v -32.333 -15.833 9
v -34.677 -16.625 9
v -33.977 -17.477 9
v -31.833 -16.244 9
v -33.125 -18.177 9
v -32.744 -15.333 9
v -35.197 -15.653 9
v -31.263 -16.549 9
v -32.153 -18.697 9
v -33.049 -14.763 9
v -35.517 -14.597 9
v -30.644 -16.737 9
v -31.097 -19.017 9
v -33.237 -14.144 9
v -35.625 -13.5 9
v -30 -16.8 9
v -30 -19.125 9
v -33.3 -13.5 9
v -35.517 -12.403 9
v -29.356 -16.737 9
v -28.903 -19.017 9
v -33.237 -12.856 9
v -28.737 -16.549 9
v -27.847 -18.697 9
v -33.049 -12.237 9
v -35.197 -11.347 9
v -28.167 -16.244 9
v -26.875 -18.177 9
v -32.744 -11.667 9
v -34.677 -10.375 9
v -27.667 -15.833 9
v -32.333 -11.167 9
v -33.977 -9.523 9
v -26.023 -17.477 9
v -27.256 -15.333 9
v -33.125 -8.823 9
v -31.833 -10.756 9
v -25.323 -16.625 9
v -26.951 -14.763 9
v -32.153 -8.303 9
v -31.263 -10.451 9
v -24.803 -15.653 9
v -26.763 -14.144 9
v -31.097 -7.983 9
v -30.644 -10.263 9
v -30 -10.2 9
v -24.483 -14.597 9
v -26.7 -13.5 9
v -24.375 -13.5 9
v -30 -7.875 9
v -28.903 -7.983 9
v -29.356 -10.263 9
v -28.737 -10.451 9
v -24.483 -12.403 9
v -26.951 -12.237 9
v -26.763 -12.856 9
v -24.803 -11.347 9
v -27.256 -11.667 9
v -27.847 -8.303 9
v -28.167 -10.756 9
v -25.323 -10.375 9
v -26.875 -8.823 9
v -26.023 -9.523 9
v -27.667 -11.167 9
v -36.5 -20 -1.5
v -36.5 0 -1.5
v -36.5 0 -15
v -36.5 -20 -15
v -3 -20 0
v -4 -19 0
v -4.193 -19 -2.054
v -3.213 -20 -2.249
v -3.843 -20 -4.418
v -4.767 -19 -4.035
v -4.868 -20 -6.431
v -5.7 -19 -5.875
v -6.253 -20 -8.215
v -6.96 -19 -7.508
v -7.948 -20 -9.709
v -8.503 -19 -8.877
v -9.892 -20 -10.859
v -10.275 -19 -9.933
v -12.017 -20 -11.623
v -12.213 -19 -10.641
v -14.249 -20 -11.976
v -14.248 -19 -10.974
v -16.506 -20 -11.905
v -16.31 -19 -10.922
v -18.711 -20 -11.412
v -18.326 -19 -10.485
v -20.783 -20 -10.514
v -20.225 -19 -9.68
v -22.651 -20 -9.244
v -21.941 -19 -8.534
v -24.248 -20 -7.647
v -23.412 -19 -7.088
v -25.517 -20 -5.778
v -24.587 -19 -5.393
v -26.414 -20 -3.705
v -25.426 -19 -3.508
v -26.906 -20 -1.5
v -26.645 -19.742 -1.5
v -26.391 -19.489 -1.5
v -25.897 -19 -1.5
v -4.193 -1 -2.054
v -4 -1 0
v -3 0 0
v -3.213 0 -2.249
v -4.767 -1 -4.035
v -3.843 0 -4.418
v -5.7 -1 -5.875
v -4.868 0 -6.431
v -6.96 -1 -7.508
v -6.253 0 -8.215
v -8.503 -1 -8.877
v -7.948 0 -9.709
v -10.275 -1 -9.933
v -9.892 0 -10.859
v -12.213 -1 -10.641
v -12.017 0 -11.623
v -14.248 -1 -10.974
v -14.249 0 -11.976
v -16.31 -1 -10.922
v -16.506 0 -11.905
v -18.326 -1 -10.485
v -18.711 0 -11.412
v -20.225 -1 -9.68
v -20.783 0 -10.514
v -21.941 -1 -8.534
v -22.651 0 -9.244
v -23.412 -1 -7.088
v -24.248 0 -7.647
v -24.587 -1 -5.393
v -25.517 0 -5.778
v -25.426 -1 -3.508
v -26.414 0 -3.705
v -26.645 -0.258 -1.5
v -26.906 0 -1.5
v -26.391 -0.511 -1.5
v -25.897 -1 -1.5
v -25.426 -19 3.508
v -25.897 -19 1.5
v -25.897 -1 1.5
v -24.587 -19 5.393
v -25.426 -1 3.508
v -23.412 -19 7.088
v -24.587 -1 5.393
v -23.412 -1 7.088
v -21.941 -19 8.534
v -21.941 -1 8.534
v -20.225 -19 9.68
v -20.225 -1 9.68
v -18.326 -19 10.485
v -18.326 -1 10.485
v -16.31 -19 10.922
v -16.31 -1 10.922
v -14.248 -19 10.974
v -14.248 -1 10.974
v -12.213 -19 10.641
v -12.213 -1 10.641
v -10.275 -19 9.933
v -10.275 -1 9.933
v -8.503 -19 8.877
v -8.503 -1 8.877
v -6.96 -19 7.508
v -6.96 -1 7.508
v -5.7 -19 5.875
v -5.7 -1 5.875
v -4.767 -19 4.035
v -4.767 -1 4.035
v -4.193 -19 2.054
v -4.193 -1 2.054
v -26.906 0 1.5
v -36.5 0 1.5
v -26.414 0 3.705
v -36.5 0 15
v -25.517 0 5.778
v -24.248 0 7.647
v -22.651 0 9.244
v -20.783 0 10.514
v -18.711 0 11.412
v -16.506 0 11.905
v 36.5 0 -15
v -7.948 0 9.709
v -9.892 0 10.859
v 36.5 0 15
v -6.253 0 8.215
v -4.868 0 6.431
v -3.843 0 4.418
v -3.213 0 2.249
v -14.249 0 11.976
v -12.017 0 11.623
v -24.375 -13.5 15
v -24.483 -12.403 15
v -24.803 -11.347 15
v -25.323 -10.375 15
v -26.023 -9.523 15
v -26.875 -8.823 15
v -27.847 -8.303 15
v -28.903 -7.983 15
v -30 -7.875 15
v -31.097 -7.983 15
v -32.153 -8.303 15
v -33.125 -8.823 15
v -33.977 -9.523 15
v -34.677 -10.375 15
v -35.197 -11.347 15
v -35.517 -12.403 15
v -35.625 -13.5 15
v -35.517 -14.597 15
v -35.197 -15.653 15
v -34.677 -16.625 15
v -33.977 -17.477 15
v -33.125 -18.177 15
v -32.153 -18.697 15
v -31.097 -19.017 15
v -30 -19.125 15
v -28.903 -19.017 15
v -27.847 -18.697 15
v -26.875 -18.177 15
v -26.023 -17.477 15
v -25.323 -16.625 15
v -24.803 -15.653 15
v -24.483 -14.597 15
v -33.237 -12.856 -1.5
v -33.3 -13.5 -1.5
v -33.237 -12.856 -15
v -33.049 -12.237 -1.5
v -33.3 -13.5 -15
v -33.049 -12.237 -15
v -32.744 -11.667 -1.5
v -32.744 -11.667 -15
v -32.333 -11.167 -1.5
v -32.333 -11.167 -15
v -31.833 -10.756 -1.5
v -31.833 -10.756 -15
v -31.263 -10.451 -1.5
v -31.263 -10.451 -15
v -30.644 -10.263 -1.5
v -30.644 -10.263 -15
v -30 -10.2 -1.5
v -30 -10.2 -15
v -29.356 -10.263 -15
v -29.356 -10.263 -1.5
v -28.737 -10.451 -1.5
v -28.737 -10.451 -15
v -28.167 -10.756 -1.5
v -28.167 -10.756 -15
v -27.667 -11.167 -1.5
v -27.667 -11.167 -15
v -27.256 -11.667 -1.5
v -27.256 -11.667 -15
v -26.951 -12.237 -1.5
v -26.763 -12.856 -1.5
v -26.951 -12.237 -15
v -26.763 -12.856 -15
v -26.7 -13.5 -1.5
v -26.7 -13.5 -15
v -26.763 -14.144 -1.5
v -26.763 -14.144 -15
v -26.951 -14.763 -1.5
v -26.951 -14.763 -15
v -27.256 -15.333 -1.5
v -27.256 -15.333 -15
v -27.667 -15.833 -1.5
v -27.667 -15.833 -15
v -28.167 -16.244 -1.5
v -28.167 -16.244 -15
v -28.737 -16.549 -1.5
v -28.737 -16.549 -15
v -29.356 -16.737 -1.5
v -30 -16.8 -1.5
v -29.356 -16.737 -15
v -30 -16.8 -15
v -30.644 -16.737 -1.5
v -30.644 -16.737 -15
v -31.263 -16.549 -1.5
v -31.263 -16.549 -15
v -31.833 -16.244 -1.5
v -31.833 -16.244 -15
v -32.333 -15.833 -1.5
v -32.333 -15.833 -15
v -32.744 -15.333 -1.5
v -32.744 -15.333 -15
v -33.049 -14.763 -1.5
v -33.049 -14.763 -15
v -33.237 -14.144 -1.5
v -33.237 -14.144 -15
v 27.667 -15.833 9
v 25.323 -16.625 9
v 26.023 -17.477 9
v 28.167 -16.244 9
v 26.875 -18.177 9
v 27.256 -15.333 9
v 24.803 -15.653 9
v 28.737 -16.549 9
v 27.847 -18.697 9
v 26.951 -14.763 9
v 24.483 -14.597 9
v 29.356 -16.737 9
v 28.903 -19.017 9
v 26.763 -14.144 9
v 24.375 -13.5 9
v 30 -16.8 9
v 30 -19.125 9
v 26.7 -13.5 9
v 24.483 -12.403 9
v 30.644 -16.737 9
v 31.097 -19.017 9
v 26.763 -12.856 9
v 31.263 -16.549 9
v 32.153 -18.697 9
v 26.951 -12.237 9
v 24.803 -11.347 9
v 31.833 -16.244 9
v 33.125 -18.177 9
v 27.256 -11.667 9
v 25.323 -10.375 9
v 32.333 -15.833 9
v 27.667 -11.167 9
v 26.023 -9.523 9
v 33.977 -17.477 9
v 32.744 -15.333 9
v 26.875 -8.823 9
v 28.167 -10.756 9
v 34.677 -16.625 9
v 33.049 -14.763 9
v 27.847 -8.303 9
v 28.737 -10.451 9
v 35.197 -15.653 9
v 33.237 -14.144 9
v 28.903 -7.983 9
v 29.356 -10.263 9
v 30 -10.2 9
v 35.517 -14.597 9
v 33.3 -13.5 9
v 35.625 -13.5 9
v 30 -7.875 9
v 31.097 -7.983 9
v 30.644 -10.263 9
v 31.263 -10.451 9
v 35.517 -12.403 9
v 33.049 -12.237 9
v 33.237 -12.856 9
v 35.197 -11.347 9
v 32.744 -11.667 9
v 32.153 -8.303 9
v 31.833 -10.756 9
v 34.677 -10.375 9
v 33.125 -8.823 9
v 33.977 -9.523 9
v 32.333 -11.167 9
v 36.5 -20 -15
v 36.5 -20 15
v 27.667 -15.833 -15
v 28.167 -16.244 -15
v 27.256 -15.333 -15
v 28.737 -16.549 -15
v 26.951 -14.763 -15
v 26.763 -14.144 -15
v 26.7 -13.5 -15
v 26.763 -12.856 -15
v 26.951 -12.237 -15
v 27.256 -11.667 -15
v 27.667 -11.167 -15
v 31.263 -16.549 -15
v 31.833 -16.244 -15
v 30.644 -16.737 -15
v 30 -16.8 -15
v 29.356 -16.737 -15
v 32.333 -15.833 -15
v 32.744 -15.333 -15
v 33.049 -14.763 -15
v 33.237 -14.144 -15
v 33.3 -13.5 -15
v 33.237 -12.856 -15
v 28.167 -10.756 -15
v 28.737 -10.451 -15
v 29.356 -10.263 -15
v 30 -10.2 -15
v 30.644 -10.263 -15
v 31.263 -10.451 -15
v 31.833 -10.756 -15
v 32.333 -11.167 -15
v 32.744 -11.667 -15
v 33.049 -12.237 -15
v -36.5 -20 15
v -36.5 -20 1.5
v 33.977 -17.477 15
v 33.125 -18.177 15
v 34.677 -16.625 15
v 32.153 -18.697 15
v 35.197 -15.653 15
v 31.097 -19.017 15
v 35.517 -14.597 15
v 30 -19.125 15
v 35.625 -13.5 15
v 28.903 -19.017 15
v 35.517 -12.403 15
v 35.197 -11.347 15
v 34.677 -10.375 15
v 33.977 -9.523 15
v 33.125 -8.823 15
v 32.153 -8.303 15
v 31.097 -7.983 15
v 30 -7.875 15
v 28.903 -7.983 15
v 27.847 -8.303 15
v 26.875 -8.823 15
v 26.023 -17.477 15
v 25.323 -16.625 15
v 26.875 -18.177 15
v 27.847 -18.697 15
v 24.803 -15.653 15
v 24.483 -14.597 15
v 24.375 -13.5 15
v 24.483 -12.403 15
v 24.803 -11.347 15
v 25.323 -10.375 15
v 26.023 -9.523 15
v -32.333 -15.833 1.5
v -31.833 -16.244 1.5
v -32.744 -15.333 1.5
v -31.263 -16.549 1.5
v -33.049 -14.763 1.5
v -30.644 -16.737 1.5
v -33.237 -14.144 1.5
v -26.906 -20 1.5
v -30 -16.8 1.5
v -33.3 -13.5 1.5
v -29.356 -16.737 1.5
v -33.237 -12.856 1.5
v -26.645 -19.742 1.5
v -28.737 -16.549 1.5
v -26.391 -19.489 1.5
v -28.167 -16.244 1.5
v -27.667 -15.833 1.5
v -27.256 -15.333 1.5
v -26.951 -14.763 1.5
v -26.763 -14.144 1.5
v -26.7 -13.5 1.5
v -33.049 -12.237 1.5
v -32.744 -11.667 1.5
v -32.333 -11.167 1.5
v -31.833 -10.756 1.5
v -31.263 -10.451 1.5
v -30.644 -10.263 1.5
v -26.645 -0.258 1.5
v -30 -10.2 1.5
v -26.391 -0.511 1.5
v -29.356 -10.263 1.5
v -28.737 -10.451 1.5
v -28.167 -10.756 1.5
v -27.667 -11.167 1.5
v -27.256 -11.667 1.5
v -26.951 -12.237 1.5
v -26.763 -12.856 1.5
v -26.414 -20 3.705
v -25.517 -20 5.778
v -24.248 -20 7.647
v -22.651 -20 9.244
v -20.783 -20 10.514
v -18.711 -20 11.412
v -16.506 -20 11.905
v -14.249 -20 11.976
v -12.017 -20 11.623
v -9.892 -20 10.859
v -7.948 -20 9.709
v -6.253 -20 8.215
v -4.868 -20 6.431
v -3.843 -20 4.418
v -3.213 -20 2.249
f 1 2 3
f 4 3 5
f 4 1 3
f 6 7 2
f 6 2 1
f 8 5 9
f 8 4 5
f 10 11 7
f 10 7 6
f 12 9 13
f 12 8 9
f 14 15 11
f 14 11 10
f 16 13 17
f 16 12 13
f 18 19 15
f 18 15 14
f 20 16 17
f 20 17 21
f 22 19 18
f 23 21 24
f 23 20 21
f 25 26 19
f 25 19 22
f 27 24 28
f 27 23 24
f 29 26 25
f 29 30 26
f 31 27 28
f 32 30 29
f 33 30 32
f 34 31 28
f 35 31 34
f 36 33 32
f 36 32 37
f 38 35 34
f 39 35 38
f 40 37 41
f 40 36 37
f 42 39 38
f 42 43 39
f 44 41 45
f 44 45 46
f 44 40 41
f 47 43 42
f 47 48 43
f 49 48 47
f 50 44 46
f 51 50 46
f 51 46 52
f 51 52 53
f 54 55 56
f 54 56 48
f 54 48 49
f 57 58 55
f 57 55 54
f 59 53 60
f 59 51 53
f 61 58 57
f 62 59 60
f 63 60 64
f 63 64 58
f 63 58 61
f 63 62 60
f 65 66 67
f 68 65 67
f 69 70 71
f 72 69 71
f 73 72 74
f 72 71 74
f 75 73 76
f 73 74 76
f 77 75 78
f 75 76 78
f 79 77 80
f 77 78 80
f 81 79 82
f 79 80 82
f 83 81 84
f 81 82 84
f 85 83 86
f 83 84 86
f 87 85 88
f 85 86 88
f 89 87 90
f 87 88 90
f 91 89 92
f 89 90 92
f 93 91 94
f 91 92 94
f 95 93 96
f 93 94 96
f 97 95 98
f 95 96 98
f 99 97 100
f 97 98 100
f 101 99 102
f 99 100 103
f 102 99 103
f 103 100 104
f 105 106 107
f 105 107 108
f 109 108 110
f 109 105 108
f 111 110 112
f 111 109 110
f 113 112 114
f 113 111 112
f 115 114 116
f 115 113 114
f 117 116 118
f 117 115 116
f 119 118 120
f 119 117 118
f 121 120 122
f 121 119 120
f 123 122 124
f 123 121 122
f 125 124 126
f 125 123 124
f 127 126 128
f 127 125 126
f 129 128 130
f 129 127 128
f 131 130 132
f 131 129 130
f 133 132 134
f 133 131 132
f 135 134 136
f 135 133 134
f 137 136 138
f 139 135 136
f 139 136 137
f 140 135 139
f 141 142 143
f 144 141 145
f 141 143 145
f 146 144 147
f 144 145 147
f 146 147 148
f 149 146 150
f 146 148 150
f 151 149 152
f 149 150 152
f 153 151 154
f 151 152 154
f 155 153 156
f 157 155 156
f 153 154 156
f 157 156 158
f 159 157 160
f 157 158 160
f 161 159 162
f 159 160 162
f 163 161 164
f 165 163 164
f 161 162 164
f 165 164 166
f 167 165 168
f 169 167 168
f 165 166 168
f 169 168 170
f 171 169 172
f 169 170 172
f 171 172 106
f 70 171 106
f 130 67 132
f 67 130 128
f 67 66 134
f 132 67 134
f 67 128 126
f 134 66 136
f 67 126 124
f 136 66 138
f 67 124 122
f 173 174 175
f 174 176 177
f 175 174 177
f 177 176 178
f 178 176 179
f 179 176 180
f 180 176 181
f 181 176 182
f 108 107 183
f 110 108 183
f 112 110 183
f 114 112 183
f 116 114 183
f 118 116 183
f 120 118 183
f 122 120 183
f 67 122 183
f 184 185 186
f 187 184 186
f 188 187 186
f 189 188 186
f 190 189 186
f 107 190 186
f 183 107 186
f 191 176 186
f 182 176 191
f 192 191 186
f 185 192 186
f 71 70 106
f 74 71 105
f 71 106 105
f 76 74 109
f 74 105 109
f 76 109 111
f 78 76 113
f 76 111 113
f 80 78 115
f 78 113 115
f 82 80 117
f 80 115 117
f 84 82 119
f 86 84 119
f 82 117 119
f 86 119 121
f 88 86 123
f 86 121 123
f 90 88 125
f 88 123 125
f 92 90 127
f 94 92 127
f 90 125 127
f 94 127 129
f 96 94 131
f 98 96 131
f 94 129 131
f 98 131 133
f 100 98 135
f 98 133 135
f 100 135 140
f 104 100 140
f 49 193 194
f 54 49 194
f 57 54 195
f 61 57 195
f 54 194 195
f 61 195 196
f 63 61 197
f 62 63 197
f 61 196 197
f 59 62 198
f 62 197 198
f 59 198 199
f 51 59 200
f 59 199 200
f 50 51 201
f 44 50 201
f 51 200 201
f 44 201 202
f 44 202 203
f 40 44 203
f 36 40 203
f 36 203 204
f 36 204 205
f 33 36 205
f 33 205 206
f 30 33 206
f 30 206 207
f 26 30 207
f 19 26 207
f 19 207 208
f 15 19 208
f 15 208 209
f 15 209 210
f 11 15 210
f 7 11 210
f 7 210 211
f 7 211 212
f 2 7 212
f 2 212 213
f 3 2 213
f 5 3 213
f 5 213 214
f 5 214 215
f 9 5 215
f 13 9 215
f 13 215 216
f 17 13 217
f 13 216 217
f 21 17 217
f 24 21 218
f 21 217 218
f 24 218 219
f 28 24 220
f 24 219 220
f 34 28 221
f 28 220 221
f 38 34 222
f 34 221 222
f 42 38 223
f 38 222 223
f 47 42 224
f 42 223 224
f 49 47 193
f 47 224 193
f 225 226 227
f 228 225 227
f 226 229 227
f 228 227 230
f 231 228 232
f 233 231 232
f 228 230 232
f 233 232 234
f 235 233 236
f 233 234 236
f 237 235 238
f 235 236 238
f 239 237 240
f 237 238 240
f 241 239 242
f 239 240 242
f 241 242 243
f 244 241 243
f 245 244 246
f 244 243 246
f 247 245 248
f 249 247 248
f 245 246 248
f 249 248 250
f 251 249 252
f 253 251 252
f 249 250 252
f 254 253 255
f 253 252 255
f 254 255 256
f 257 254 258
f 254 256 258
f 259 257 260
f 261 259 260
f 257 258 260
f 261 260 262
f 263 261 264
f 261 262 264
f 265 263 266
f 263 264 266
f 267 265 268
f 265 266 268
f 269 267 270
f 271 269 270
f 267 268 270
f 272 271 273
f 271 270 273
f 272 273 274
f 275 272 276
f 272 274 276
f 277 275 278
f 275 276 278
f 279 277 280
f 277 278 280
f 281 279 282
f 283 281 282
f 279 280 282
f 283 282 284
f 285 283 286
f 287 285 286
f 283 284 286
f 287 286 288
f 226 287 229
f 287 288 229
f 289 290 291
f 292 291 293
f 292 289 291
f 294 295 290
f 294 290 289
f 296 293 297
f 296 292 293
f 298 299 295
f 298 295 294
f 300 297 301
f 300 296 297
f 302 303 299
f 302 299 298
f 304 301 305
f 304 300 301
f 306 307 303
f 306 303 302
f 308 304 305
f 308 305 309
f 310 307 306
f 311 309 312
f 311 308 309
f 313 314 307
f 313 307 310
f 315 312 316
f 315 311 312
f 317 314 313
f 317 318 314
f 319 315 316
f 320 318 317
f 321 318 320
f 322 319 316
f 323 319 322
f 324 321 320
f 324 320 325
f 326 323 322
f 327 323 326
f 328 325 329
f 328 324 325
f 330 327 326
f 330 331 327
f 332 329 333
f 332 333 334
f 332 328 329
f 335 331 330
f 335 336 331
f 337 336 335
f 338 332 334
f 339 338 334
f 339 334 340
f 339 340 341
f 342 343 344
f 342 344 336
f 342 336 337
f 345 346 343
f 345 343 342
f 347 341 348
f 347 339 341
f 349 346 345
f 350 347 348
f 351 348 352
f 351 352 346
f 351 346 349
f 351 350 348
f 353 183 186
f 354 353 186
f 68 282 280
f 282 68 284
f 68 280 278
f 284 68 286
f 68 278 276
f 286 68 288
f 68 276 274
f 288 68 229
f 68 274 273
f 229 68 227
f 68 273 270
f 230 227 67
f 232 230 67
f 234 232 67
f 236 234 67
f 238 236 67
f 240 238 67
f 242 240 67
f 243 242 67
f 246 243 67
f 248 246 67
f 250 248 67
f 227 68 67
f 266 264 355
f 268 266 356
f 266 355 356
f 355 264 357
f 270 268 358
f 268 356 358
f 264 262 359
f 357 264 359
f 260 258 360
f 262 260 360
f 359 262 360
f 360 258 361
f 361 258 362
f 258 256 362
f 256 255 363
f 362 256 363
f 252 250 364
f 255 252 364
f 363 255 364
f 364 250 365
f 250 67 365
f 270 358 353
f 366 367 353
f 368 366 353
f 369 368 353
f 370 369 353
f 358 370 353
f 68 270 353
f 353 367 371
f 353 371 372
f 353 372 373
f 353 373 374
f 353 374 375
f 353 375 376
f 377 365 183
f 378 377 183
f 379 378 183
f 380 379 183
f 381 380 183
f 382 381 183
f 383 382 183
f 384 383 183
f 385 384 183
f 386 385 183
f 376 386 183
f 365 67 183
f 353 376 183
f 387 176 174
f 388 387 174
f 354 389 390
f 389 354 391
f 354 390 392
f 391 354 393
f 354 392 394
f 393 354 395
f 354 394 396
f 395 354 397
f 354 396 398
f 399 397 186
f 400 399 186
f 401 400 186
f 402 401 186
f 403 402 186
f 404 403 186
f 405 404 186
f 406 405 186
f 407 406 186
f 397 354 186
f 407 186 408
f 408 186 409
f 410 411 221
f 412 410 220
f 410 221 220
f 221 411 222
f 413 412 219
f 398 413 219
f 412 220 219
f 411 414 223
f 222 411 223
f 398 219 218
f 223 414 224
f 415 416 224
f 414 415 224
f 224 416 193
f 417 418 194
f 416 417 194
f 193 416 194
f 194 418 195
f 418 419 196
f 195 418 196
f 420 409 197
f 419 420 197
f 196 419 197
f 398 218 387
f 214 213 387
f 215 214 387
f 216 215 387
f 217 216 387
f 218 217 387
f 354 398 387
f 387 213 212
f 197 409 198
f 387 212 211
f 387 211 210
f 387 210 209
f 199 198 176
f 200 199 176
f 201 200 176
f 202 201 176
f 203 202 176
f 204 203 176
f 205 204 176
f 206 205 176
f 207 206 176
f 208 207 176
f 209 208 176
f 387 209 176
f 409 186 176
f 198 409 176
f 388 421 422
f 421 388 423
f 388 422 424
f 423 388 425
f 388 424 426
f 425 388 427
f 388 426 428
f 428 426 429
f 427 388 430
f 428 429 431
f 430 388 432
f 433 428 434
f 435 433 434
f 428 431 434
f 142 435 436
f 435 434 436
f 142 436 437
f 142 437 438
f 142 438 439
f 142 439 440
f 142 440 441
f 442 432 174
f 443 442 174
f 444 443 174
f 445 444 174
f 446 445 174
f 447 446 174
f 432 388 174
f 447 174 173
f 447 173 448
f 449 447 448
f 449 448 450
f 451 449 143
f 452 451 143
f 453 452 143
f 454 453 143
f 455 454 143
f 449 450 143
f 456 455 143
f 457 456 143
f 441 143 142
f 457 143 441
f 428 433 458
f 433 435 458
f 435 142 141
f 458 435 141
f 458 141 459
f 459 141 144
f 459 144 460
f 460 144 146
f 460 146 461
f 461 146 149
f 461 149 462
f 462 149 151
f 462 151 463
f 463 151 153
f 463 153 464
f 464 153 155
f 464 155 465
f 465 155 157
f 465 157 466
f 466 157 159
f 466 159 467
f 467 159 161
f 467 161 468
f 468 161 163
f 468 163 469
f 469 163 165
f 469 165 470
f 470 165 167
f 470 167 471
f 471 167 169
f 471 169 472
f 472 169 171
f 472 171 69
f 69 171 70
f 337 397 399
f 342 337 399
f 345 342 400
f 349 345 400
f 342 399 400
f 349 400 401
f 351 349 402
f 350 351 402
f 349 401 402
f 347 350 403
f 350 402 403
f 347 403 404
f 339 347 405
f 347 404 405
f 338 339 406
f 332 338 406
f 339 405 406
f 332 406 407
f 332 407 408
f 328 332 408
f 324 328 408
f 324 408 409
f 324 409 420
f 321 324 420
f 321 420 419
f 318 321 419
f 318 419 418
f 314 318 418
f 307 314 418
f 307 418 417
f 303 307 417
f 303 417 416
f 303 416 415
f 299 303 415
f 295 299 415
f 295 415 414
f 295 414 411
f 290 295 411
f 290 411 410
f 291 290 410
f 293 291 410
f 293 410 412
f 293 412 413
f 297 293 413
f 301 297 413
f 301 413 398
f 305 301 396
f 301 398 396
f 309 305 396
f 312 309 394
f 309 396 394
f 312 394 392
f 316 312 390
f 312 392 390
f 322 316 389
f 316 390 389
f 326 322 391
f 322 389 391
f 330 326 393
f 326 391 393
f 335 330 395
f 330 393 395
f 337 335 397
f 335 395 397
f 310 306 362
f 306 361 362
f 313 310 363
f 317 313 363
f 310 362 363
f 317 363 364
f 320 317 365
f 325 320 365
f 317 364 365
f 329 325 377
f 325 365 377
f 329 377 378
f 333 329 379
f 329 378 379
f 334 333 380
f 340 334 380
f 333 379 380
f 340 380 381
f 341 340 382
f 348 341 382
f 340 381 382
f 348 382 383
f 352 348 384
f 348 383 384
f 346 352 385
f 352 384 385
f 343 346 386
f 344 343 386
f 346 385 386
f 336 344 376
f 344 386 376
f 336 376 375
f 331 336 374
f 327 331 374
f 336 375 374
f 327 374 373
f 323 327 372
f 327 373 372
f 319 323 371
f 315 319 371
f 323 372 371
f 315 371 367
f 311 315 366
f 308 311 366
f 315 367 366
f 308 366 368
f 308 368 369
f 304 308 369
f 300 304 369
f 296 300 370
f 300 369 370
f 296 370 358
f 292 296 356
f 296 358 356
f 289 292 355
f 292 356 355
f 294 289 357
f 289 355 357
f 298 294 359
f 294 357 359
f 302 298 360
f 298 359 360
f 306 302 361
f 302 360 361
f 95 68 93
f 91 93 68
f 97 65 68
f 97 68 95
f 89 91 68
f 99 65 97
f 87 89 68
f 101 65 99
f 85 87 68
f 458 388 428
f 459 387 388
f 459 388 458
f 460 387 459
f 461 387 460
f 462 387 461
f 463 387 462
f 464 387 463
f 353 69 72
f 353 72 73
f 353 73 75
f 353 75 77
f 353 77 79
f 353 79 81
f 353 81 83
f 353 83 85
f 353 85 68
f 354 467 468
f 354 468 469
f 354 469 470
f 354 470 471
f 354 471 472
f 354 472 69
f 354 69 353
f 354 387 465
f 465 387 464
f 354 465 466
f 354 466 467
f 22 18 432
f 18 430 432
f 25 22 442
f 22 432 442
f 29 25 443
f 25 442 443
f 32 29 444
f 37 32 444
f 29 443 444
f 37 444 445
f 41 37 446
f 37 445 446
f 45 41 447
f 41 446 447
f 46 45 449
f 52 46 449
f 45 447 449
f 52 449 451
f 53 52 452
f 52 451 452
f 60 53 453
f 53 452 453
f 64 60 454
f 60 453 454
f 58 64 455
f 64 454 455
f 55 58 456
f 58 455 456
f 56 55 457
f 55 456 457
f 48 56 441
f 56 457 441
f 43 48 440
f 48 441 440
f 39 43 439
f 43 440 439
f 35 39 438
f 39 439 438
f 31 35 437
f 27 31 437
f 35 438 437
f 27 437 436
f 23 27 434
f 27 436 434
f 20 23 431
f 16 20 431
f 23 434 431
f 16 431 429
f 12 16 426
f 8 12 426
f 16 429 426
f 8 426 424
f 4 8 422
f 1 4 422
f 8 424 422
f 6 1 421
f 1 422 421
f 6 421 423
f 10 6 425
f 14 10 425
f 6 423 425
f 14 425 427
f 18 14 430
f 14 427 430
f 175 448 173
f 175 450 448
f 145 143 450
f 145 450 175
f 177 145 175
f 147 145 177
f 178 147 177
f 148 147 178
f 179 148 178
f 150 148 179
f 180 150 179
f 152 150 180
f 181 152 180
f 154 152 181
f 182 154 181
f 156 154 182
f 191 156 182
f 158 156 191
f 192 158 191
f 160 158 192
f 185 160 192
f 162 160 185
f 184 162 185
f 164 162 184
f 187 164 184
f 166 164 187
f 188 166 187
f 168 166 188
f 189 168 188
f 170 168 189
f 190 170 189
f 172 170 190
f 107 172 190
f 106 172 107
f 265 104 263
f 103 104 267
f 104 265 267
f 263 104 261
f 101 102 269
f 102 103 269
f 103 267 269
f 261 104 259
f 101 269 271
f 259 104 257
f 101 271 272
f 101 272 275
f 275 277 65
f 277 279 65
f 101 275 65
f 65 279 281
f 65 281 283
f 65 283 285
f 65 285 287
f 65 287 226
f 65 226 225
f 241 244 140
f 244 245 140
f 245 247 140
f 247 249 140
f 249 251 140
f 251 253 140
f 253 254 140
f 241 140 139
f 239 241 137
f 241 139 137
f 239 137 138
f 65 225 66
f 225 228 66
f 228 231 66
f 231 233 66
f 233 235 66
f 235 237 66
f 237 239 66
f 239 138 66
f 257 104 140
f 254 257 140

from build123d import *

# Parameters (mm, degrees)
F1_DEPTH       = 20
F3_D           = 6.6
F3_CBORE_D     = 11.25
F3_CBORE_DEPTH = 6
F4_SIZE        = 1


with BuildPart() as f1:
    # F0 (on Front) → F1 (new body)
    with BuildSketch(Plane.XZ):
        with BuildLine():
            Line((36.5, 15), (-36.5, 15))
            Line((-36.5, 15), (-36.5, 1.5))
            Line((-36.5, 1.5), (-25.8972473589, 1.5))
            ThreePointArc((-25.8972473589, 1.5), (-14.2482423753, 10.9742817748), (-4, 0))
            ThreePointArc((-4, 0), (-14.2482423753, -10.9742817748), (-25.8972473589, -1.5))
            Line((-25.8972473589, -1.5), (-36.5, -1.5))
            Line((-36.5, -1.5), (-36.5, -15))
            Line((-36.5, -15), (36.5, -15))
            Line((36.5, -15), (36.5, 15))
        make_face()
    extrude(amount=F1_DEPTH)

    # F3 (through all)
    with Locations(Plane.XY.offset(15)):
        with Locations((-30, -13.5), (30, -13.5)):
            CounterBoreHole(F3_D / 2, F3_CBORE_D / 2, F3_CBORE_DEPTH)

    # F4
    f4_edges = [f1.edges().sort_by_distance(p)[0] for p in [
        (-4, -20, 0),
        (-4, 0, 0),
    ]]
    chamfer(f4_edges, length=F4_SIZE)


solid = f1.part
